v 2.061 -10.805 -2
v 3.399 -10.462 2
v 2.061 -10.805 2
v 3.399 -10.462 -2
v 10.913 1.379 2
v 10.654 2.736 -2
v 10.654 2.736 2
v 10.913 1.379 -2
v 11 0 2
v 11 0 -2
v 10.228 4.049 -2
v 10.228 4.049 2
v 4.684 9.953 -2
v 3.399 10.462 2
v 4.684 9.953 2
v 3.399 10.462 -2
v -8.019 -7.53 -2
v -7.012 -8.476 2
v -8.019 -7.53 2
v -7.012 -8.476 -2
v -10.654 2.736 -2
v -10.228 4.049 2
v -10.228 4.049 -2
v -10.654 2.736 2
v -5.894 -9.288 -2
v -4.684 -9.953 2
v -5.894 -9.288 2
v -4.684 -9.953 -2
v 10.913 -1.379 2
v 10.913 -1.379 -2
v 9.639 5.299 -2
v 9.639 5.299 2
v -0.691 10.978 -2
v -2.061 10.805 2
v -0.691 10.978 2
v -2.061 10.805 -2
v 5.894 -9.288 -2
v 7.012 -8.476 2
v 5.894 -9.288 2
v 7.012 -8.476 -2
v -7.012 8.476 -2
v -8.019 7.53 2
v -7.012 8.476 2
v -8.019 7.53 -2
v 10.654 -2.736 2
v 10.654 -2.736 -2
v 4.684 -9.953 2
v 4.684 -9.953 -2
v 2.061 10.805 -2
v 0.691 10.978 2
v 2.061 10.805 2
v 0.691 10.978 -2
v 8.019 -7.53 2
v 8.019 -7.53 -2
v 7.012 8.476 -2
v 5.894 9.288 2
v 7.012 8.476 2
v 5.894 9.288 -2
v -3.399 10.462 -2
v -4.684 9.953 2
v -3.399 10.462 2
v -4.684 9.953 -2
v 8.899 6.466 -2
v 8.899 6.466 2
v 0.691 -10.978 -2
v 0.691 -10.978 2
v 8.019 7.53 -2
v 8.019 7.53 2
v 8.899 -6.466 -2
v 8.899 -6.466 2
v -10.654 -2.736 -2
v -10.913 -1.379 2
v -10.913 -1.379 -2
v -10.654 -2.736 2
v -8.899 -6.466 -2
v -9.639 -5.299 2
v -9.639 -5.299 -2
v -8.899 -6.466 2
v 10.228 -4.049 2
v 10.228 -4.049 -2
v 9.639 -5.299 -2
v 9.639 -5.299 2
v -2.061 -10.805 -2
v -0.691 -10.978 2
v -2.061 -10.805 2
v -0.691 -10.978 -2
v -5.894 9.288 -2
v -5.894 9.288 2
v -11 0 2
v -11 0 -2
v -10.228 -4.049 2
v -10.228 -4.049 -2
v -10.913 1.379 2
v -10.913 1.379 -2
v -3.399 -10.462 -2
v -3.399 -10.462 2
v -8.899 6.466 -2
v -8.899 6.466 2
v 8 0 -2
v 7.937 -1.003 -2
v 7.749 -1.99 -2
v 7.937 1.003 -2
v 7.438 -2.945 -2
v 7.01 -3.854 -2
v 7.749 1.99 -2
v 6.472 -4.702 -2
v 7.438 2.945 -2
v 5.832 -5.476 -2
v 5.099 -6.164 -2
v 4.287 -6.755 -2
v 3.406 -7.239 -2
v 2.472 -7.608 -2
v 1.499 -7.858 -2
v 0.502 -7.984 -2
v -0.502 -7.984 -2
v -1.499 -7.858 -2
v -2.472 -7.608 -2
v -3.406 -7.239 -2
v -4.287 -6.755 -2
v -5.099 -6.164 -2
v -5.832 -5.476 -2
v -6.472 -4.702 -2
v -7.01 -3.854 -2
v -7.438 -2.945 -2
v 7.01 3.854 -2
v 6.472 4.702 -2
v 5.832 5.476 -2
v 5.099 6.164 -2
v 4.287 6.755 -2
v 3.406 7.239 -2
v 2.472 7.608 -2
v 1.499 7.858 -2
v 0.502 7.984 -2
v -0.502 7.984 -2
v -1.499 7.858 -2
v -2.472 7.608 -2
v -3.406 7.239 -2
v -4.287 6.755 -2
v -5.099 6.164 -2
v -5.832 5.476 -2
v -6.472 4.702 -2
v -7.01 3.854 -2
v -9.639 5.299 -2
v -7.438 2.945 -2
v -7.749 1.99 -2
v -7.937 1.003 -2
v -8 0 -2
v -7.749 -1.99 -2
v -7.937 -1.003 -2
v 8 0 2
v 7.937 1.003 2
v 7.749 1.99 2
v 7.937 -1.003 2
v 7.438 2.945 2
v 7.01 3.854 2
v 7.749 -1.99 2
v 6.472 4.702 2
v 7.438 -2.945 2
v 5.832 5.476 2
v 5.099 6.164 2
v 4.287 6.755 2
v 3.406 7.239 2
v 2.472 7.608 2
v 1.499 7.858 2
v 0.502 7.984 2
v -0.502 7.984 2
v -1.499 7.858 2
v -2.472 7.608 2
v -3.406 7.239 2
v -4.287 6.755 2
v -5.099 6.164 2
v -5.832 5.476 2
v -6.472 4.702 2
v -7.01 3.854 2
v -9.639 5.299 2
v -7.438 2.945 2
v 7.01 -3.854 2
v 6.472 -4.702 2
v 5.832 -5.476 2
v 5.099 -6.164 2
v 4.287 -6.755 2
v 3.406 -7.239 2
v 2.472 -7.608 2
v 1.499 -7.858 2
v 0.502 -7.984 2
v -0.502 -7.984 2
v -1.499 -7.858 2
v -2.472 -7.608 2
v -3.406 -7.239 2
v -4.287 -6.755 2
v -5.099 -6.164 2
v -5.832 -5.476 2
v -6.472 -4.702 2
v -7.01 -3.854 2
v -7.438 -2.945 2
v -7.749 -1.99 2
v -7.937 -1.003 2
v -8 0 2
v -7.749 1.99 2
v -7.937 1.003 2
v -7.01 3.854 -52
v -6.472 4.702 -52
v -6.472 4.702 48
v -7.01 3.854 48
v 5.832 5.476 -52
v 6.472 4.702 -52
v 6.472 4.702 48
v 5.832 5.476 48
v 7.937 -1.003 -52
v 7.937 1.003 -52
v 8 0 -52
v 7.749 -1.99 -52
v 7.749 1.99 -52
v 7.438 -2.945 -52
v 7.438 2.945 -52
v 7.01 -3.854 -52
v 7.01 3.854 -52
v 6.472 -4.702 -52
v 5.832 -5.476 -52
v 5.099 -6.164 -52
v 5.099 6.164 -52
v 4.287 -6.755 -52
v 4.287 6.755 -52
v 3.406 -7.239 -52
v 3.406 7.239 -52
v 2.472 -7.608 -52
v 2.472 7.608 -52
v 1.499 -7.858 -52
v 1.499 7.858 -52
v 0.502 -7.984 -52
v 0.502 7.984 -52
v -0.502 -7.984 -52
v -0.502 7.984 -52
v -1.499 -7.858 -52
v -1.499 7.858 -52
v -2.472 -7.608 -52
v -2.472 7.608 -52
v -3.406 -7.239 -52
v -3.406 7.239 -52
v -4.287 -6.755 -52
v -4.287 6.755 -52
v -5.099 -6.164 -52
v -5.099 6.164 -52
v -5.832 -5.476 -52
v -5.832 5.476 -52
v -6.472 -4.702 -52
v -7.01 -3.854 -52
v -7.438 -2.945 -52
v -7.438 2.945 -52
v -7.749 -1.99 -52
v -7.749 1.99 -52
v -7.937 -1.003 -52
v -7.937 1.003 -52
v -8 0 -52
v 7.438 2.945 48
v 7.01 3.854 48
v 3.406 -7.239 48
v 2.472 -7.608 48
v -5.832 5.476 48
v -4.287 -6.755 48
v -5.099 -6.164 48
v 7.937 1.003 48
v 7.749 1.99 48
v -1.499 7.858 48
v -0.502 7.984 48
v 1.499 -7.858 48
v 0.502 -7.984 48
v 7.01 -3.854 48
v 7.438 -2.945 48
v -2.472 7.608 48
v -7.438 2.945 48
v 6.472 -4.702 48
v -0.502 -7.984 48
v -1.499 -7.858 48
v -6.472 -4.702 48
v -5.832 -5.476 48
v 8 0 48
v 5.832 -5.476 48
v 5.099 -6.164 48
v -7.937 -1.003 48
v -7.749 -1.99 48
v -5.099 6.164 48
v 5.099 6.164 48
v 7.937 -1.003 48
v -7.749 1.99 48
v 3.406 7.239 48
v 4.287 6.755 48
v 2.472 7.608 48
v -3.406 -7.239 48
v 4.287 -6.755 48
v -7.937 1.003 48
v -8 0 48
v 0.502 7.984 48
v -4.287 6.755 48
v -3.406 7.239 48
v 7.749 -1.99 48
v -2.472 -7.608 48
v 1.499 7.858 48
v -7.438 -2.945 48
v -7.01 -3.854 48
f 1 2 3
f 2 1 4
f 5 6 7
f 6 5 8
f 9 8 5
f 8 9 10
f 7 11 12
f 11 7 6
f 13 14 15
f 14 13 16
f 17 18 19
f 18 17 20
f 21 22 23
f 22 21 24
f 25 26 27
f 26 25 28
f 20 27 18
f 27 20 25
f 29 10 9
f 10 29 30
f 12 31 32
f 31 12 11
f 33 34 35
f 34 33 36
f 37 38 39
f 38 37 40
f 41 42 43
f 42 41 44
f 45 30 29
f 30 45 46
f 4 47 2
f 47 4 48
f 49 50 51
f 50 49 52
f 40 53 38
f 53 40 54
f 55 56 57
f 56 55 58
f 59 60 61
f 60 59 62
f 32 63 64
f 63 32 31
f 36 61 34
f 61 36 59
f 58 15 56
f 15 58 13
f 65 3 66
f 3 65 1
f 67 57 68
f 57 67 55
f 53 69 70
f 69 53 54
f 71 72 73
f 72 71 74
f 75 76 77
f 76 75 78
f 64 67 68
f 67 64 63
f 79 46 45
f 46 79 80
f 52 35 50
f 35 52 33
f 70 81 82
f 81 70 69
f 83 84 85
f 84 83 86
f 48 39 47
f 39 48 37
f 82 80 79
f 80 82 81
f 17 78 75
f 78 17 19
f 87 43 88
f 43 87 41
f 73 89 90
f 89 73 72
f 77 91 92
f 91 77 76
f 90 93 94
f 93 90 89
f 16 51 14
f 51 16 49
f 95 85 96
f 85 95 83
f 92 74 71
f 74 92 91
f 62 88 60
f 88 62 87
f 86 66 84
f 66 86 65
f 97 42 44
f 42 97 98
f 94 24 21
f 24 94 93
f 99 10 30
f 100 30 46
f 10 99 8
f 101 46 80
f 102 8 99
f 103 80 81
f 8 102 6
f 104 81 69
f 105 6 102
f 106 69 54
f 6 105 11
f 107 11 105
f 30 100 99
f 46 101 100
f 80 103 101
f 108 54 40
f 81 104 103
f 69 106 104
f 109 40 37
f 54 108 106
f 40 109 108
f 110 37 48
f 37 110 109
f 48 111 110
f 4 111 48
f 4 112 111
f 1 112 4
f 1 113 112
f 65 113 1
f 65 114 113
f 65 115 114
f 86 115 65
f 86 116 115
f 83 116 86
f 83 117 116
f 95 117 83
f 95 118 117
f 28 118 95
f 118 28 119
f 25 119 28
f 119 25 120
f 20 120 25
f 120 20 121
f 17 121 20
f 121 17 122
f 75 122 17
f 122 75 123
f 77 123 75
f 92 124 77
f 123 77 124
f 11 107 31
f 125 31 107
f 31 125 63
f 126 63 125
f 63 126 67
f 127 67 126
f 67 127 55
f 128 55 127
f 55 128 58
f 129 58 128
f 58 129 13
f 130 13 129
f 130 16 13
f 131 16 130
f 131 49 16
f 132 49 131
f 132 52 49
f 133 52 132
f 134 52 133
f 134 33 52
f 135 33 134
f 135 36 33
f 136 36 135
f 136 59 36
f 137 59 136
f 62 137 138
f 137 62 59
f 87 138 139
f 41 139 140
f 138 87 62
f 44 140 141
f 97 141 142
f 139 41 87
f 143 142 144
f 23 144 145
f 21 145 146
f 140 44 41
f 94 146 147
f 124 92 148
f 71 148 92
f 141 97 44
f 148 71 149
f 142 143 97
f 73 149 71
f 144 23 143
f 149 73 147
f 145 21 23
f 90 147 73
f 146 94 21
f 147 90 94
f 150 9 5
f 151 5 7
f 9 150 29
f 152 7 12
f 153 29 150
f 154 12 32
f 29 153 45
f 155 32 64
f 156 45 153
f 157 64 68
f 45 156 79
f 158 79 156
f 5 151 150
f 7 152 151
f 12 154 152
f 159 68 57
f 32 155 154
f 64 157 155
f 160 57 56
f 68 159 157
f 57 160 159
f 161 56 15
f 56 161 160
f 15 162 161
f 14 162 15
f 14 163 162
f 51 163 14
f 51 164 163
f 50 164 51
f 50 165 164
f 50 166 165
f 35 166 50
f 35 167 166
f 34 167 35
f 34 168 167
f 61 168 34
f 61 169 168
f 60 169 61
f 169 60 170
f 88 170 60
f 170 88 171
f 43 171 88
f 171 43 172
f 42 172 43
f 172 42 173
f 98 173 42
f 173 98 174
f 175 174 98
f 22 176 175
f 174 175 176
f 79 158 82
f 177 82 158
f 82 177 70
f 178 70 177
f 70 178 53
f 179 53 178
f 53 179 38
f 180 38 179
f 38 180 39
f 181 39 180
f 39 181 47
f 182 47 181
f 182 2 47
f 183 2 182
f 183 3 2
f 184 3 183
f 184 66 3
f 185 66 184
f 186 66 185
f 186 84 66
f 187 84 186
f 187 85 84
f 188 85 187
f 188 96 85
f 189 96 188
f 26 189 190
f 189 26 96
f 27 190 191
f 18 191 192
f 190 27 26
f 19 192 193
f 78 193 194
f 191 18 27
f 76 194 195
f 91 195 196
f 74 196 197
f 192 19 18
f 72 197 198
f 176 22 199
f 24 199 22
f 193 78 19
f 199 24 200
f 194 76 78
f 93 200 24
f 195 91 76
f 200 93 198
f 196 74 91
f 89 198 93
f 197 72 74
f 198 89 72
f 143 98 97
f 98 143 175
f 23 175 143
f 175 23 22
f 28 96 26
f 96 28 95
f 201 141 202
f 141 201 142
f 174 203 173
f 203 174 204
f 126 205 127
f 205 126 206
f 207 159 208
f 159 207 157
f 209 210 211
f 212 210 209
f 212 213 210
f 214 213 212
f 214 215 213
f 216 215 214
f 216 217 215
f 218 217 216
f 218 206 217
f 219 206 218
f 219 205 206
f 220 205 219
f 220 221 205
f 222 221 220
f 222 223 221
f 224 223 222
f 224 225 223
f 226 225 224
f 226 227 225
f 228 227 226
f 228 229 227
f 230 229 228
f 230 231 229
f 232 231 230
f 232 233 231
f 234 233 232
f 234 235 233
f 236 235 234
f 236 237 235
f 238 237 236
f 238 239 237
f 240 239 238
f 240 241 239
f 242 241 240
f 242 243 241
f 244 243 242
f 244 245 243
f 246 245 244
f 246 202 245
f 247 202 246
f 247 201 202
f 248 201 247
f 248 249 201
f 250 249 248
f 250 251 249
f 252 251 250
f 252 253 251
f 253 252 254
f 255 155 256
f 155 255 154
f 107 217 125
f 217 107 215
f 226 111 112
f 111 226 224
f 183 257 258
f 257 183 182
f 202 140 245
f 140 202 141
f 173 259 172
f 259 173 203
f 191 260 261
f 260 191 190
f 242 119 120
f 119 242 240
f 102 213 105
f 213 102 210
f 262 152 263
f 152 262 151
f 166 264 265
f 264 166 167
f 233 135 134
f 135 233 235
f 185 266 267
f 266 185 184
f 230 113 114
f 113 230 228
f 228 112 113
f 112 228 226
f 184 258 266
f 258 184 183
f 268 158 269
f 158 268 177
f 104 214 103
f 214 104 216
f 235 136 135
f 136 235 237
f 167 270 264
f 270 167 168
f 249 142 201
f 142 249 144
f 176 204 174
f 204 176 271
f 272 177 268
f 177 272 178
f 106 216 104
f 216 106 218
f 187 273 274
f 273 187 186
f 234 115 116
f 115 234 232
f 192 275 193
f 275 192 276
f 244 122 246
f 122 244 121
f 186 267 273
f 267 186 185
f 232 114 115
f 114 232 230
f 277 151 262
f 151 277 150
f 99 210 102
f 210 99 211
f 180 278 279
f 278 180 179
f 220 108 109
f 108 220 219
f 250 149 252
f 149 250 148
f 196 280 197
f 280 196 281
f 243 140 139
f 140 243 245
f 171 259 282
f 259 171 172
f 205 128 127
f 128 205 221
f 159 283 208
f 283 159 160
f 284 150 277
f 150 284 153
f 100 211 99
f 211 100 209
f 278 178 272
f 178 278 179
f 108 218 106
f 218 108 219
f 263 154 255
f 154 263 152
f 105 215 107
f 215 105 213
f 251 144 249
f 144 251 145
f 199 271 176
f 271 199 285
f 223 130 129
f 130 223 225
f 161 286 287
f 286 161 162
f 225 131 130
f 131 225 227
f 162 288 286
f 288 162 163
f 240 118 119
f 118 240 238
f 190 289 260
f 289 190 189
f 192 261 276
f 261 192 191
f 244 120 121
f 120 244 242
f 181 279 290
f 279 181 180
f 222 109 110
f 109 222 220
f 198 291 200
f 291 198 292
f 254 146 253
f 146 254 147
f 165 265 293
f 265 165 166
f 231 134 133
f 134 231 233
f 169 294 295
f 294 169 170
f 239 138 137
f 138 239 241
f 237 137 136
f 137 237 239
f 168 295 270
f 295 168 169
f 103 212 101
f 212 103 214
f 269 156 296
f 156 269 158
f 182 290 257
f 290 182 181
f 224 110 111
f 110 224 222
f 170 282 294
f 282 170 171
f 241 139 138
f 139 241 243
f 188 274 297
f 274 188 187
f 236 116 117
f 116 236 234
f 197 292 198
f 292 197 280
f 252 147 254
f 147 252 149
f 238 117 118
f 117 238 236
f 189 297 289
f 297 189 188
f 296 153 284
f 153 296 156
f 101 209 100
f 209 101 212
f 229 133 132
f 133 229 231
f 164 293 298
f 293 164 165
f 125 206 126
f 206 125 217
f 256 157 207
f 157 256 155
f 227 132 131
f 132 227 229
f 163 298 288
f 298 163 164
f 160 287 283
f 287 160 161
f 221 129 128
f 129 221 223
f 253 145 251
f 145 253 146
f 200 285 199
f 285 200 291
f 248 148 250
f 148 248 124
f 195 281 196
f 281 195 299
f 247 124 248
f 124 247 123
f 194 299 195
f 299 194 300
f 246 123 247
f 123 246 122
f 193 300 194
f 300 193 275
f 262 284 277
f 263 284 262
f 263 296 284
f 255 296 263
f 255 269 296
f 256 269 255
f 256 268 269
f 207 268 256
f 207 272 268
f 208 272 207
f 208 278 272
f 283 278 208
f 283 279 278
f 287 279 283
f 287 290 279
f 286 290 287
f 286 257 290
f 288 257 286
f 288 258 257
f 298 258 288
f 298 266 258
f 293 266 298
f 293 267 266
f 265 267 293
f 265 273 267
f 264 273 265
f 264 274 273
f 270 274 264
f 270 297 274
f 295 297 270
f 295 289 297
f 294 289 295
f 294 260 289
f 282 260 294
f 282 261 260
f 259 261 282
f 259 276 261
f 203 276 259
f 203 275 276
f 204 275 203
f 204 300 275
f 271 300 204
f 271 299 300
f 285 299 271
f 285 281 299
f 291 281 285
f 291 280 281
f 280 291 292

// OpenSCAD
$fn = 50;

difference() {
	union() {
		translate(v = [0, 0, -2.0]) {
			union() {
				difference() {
					cylinder(h = 4, r = 11);
					cylinder(h = 4, r = 4);
				}
				difference() {
					translate(v = [0, 0, -50]) {
						cylinder(h = 100, r = 8.0);
					}
				}
			}
		}
	}
	union();
}
